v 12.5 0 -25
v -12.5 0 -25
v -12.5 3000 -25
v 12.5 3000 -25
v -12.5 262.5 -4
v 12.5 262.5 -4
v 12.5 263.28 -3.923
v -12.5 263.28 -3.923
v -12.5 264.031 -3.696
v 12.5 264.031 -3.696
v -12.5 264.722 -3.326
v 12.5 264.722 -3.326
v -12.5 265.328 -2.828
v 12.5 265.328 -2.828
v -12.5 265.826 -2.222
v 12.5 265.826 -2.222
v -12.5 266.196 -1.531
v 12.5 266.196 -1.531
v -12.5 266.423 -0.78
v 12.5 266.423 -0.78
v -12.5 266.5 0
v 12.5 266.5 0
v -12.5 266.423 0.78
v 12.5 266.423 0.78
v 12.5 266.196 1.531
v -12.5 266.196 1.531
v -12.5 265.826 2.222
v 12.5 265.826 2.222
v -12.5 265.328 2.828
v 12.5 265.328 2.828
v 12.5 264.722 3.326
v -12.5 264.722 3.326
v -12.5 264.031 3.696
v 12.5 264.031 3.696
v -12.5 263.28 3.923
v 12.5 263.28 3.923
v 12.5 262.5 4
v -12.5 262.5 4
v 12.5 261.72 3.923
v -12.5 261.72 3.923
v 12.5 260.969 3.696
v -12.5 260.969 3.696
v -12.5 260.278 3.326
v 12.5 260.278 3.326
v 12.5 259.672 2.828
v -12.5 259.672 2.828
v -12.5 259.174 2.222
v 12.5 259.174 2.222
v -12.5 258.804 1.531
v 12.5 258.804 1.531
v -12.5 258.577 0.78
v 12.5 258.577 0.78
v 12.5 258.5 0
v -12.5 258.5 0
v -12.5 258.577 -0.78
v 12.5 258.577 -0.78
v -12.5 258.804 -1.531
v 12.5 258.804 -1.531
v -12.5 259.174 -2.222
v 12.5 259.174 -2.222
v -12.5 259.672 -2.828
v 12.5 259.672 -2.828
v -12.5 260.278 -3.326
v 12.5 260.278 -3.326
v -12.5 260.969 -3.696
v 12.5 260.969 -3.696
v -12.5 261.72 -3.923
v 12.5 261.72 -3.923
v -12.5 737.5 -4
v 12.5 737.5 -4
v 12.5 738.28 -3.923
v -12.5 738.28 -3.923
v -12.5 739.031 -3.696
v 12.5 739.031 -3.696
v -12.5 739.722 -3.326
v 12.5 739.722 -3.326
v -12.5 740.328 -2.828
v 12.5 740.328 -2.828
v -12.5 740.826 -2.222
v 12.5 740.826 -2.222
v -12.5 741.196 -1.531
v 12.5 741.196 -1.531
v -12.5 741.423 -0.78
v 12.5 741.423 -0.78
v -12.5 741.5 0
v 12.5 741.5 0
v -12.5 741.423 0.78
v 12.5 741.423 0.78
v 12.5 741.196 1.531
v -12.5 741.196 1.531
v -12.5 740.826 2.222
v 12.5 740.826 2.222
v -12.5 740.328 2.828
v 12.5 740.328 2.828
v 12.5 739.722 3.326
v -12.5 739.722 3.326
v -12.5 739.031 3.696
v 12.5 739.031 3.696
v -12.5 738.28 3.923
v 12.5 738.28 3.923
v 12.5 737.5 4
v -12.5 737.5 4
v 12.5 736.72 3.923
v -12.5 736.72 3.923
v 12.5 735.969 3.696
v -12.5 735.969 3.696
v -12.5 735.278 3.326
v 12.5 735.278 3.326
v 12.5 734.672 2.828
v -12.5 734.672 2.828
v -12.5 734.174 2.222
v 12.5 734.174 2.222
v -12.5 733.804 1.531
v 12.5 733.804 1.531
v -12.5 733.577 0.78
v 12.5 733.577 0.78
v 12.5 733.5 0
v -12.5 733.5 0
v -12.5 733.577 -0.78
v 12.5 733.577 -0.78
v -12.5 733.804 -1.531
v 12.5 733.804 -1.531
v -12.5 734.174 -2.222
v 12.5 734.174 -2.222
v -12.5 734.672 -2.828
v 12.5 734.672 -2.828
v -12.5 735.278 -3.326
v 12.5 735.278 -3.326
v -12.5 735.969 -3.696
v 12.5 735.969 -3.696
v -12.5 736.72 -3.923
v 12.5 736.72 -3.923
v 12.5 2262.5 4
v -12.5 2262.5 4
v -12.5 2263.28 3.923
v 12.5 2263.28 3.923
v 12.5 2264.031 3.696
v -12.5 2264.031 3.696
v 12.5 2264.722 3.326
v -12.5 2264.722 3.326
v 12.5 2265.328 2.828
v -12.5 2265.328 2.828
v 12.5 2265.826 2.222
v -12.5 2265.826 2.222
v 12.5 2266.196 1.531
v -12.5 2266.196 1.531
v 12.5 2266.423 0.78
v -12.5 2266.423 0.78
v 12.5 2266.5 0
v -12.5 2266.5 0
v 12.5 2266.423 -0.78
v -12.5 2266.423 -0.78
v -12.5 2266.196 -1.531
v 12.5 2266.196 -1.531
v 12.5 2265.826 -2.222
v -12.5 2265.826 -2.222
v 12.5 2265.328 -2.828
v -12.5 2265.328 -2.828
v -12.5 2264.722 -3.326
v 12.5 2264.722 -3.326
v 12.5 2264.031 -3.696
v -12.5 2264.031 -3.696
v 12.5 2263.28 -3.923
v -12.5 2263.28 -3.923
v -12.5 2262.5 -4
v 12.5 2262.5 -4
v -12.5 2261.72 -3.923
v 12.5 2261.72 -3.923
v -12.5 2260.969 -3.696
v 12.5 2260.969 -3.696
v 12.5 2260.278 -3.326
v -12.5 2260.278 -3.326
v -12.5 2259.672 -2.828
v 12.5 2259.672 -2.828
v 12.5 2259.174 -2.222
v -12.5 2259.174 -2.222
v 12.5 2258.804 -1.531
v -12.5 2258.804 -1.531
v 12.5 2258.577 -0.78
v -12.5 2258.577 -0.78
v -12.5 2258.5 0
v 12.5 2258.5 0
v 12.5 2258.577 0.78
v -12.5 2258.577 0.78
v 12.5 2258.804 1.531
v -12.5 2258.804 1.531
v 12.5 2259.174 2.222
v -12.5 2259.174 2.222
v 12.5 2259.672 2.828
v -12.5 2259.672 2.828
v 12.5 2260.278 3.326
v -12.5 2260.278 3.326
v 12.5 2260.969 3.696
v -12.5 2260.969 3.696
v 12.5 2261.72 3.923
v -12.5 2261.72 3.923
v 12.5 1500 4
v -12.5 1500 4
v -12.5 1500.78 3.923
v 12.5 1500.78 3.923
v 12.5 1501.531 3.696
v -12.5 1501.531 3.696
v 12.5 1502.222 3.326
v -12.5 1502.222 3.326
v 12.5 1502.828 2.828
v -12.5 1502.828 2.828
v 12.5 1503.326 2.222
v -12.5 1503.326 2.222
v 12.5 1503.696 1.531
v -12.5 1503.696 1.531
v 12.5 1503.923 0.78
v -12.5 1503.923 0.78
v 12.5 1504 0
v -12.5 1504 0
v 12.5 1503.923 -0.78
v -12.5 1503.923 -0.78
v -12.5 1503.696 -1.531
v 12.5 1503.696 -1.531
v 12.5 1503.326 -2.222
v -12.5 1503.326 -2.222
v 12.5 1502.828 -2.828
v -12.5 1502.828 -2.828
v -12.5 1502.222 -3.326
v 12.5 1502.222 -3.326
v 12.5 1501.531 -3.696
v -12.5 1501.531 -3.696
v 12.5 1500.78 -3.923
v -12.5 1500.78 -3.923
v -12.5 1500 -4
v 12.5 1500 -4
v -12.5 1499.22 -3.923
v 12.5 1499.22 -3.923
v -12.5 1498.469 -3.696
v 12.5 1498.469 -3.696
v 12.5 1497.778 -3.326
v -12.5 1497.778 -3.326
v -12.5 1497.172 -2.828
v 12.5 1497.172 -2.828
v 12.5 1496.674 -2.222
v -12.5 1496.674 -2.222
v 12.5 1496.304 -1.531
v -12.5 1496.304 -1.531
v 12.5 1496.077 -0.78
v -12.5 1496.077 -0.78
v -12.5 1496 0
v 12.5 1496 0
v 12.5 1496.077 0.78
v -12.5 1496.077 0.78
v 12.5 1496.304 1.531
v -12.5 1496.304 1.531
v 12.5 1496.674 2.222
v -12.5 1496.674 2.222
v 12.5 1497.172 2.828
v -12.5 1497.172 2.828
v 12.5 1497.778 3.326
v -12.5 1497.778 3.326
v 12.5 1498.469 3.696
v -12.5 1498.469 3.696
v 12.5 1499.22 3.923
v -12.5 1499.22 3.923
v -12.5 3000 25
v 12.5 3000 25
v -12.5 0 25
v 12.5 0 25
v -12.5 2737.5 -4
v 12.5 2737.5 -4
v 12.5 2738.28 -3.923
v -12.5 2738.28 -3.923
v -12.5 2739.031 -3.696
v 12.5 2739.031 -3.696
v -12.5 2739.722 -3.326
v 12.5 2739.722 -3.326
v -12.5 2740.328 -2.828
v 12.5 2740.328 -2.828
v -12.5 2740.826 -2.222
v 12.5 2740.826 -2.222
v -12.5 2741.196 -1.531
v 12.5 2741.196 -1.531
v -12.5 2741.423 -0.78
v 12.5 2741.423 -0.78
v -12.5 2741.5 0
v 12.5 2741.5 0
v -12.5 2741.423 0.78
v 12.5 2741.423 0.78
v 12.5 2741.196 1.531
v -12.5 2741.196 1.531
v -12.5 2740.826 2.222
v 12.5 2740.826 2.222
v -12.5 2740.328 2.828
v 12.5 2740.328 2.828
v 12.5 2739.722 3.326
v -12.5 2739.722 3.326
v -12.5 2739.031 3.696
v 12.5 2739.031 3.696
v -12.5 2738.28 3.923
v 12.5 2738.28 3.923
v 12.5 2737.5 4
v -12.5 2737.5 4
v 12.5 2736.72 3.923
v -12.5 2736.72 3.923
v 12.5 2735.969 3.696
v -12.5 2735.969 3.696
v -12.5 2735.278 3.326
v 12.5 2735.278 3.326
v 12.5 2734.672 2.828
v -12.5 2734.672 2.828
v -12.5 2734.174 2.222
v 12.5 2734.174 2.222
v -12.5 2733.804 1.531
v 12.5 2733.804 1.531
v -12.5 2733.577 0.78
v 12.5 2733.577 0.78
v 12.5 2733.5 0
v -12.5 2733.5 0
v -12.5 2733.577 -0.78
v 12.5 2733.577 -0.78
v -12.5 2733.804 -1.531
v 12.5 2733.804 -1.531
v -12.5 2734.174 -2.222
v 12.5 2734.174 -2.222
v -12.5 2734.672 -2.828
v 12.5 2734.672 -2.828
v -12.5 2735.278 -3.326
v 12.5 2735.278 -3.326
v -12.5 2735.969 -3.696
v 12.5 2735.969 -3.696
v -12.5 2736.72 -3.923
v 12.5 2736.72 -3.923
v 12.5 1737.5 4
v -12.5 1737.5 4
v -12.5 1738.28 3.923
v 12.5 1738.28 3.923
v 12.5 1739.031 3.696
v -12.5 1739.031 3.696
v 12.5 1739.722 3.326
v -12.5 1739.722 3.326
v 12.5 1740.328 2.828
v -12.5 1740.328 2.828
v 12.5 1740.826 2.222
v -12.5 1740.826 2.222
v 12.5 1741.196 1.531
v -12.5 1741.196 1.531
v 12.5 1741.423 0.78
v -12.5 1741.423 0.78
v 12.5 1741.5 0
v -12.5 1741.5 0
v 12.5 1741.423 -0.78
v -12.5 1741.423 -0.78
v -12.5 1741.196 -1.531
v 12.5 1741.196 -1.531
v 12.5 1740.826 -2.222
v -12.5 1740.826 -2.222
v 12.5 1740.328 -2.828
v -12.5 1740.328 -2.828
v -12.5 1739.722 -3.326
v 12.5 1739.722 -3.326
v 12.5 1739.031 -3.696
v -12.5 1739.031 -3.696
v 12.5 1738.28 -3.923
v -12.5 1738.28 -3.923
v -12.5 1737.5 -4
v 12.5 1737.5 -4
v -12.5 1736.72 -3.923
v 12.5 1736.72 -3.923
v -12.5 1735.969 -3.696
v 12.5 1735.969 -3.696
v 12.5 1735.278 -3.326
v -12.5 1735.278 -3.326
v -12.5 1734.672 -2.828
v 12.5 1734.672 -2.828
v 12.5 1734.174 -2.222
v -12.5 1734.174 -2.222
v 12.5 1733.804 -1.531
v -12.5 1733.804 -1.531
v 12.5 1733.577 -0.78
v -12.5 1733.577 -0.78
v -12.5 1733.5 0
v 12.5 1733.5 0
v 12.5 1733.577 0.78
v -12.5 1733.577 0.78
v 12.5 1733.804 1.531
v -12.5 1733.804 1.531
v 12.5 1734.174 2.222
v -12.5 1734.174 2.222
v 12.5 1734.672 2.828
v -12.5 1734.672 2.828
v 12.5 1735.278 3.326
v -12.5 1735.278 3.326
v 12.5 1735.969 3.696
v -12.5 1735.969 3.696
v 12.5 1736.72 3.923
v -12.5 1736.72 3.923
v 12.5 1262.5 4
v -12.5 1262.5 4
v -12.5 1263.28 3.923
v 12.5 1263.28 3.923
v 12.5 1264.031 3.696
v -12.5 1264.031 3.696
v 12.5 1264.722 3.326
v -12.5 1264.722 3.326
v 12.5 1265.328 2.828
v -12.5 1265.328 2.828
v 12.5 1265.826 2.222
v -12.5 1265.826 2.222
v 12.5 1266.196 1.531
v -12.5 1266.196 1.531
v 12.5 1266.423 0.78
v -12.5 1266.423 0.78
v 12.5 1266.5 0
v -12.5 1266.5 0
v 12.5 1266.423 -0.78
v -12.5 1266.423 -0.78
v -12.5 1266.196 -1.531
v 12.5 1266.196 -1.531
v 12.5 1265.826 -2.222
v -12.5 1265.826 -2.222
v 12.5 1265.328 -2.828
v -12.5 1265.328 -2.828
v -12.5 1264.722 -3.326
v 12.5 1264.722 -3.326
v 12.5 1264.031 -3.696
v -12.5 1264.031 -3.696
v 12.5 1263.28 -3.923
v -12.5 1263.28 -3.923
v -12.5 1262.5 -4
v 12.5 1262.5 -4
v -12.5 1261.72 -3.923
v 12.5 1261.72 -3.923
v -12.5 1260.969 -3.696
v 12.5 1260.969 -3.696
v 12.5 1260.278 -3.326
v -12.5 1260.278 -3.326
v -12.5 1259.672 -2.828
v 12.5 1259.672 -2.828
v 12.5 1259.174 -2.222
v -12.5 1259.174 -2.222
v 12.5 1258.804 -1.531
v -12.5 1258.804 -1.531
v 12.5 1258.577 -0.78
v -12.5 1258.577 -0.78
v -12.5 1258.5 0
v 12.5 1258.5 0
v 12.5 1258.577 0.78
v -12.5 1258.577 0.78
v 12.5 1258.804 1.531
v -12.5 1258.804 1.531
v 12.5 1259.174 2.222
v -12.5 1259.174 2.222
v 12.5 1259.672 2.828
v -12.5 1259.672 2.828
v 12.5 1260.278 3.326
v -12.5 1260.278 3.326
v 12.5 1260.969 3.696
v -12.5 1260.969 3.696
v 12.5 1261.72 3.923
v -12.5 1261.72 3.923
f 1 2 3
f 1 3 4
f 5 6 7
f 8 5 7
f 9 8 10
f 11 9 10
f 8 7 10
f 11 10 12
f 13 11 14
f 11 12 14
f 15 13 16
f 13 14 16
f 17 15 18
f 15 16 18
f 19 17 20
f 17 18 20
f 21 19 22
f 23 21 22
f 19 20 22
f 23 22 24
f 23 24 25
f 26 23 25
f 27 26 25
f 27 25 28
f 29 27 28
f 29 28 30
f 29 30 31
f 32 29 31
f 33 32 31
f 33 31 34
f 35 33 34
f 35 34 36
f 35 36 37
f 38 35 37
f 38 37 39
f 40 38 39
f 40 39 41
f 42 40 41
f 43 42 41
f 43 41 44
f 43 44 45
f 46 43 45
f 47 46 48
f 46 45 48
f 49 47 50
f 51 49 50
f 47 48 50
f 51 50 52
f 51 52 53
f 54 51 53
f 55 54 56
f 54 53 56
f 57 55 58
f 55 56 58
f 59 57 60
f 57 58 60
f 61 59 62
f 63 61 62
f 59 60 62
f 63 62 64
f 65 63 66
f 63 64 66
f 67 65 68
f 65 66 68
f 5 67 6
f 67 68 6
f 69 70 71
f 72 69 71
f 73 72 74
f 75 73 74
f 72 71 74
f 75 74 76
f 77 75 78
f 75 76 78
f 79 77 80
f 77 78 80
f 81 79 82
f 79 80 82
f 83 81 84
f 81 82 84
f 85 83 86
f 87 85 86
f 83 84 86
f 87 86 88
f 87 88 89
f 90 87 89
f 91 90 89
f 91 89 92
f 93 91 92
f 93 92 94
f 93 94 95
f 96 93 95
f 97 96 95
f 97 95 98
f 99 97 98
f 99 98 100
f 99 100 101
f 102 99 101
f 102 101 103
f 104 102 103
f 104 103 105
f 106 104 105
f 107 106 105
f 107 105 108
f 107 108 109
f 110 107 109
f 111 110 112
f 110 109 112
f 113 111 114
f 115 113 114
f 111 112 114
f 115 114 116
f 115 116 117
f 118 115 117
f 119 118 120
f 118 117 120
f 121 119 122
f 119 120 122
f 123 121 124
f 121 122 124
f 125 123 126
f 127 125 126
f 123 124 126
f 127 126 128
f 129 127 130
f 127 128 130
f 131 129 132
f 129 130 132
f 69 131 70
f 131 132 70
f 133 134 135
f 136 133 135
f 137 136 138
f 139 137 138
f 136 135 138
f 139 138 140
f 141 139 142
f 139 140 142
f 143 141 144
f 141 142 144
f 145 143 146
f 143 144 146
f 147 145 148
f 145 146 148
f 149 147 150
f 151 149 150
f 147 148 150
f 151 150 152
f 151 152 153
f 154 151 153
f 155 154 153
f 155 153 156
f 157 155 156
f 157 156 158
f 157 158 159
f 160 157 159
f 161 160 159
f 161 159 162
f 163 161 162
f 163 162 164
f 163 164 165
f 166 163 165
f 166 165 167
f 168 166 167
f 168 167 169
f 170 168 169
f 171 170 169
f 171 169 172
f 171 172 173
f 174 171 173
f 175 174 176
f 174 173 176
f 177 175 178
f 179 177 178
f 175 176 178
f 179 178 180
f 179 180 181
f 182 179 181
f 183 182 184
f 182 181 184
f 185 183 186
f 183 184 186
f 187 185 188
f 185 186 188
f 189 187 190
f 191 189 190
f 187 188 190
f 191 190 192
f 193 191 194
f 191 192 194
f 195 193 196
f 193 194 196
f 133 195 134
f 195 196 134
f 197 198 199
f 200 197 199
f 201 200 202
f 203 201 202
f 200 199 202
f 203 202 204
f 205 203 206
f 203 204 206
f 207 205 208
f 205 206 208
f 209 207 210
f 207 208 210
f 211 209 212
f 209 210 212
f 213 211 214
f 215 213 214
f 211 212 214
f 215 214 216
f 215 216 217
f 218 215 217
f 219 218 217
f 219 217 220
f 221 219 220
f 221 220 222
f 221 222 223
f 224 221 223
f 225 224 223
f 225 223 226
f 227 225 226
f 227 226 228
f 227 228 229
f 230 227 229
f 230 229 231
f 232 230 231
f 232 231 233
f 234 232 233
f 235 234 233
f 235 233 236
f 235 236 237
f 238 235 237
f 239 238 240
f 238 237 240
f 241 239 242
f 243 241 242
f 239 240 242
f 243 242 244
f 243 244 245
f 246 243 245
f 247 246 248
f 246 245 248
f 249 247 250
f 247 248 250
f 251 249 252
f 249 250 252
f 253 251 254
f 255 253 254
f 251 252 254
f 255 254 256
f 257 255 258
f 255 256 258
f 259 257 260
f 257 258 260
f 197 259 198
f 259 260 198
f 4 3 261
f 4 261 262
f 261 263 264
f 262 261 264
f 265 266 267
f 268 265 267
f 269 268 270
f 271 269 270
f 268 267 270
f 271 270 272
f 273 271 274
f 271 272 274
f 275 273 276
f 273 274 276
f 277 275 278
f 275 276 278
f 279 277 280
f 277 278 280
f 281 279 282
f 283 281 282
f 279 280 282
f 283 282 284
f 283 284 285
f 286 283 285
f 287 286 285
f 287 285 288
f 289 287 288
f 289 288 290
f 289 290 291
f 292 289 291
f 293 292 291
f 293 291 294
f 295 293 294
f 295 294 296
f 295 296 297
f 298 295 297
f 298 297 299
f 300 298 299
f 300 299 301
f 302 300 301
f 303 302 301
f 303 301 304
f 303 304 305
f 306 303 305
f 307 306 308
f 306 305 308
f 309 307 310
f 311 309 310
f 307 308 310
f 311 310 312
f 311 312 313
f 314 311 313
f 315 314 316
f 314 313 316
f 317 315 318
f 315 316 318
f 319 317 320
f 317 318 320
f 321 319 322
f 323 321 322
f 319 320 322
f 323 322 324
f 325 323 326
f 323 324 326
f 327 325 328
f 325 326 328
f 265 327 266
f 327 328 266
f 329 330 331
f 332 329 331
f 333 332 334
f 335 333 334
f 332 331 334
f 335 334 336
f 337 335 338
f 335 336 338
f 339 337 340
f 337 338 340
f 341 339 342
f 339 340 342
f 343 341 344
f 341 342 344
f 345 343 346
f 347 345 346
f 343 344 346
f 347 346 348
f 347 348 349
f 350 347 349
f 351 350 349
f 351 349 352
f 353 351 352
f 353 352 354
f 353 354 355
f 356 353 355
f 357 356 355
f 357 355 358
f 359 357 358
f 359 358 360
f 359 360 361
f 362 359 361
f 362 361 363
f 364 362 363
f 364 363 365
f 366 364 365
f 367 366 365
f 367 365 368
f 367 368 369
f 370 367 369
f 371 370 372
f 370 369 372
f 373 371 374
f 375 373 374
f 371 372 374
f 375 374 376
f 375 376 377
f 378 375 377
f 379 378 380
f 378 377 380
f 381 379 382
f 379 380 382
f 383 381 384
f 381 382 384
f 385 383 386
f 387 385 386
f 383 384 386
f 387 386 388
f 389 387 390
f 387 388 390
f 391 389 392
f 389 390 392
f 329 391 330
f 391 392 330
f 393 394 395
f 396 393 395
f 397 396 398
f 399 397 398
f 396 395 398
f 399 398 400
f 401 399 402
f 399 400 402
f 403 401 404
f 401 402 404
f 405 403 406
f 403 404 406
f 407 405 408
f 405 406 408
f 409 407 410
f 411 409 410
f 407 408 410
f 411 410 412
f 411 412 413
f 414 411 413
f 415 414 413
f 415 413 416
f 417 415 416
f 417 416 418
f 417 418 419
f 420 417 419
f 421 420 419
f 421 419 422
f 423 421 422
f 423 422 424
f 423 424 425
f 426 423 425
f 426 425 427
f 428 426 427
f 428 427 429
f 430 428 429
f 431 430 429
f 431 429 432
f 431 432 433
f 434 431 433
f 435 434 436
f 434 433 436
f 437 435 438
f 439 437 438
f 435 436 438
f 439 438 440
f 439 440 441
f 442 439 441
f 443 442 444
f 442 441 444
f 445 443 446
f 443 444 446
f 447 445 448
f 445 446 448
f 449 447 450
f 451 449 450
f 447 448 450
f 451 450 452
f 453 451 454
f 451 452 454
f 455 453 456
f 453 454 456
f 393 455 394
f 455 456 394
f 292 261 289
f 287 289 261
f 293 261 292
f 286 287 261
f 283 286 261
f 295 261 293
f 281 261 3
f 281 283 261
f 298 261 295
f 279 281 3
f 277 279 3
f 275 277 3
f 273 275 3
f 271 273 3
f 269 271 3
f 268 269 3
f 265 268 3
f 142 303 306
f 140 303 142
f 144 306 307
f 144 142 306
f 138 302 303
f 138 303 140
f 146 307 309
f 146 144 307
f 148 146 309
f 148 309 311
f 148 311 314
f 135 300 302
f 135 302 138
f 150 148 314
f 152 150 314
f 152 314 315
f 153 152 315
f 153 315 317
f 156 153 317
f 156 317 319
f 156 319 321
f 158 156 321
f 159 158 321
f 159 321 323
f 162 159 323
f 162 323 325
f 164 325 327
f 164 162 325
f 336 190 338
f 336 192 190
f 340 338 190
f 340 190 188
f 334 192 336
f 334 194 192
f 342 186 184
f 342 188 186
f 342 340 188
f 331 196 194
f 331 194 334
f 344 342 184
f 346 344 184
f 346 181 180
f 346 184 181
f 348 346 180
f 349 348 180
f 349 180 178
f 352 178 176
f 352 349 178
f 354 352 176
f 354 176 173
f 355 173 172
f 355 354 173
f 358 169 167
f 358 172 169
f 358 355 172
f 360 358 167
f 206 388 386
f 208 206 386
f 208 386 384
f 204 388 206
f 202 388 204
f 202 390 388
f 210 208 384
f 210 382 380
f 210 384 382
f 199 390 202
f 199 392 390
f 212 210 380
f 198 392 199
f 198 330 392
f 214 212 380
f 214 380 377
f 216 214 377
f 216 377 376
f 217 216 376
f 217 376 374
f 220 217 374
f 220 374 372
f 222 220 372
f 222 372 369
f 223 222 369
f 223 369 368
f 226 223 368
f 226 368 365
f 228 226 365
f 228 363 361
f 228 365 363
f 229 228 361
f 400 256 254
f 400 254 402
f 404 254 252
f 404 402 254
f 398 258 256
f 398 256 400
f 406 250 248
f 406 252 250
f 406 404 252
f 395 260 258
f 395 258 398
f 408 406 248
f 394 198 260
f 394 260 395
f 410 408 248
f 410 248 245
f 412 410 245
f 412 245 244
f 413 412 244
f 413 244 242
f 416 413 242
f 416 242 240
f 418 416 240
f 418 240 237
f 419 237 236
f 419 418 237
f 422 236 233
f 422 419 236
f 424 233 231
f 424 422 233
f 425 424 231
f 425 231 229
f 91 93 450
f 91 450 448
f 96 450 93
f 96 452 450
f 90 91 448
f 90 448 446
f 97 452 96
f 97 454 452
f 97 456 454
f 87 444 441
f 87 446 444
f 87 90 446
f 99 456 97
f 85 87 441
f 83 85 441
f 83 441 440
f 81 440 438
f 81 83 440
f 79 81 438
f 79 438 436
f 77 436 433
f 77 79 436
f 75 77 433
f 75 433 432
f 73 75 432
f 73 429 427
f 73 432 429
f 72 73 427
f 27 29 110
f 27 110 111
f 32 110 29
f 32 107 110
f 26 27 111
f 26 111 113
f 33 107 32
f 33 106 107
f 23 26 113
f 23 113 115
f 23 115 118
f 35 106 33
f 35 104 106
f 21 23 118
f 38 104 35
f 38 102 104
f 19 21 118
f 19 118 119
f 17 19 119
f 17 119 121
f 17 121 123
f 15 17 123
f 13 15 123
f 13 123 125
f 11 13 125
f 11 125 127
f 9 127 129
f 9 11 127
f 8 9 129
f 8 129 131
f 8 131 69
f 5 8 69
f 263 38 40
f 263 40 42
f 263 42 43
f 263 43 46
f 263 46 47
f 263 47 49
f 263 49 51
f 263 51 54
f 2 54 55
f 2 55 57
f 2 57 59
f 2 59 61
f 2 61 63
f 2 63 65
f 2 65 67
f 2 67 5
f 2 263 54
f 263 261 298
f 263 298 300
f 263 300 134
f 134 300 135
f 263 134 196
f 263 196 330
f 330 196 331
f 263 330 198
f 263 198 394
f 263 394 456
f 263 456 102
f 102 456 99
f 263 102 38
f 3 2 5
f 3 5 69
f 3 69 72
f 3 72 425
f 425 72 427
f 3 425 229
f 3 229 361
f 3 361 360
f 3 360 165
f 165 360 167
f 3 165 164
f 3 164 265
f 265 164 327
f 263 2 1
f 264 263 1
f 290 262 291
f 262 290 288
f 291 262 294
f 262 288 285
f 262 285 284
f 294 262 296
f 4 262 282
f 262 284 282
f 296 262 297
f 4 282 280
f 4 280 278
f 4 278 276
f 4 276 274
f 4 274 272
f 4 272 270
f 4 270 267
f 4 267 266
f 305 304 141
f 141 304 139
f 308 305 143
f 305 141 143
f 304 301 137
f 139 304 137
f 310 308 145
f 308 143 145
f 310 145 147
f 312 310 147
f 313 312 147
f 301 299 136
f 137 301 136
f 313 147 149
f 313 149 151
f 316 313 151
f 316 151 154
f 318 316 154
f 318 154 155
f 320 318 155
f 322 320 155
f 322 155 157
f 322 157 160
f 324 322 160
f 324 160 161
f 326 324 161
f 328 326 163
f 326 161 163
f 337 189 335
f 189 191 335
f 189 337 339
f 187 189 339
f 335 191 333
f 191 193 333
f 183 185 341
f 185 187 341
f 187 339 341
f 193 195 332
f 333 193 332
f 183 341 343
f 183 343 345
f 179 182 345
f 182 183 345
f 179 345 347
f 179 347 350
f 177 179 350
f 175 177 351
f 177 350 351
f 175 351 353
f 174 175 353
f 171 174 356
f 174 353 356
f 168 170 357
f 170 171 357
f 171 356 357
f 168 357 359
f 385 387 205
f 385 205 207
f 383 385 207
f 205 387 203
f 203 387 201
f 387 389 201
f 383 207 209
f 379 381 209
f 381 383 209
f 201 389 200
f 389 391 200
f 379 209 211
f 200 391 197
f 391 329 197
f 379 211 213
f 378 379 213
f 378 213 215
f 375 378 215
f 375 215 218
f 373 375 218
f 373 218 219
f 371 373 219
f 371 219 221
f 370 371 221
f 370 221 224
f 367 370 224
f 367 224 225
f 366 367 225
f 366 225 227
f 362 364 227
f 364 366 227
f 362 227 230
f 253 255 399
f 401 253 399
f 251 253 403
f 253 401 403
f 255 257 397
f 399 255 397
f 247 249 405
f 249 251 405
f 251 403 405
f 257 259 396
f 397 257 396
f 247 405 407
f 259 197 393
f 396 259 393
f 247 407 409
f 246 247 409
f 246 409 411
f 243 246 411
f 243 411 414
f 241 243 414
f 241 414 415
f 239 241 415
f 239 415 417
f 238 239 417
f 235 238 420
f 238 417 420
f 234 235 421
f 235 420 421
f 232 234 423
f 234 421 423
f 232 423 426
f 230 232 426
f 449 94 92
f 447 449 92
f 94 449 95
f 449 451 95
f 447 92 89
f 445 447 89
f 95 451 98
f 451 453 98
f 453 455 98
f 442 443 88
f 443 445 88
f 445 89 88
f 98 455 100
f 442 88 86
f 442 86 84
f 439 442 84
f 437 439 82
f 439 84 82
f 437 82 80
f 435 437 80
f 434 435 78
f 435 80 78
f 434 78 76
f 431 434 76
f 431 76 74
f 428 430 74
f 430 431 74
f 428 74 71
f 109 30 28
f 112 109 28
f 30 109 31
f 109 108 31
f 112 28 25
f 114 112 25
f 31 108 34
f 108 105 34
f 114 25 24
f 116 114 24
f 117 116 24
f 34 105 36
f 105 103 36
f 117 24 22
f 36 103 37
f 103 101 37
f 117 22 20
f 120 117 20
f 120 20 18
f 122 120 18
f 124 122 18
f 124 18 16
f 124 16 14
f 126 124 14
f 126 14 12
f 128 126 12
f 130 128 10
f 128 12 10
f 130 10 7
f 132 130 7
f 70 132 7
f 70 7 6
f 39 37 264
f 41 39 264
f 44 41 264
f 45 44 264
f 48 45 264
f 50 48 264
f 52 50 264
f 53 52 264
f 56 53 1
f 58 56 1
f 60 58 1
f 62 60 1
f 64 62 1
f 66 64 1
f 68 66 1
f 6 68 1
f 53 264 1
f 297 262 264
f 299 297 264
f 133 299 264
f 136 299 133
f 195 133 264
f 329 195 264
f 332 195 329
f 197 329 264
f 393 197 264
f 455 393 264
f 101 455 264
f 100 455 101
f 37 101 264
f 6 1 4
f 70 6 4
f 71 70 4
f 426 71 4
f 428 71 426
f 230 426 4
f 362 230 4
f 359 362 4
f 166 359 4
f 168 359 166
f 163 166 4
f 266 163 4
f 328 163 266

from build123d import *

# Parameters (mm, degrees)
SKETCH_1_W          = 25
SKETCH_1_H          = 50
EXTRUDE_1_DEPTH     = 3000
SKETCH_2_R          = 4
CUT_EXTRUDE_1_DEPTH = 3000
SKETCH_3_R          = 4
CUT_EXTRUDE_2_DEPTH = 3000
SKETCH_4_R          = 4
CUT_EXTRUDE_3_DEPTH = 3000
SKETCH_5_R          = 4
CUT_EXTRUDE_4_DEPTH = 50


with BuildPart() as part:
    # Эскиз1 → Бобышка-Вытянуть1 (new body)
    with BuildSketch(Plane(origin=(0, 0, 0), x_dir=(1, 0, 0), z_dir=(0, 1, 0))):
        Rectangle(SKETCH_1_W, SKETCH_1_H)
    extrude(amount=EXTRUDE_1_DEPTH)

    # Эскиз2 → Вырез-Вытянуть1 (cut)
    with BuildSketch(Plane(origin=(12.5, 0, 0), x_dir=(0, 0, -1), z_dir=(1, 0, 0))):
        with Locations((0, 2737.5)):
            Circle(SKETCH_2_R)
        with Locations((0, 262.5)):
            Circle(SKETCH_2_R)
        with Locations((0, 737.5)):
            Circle(SKETCH_2_R)
    extrude(amount=-CUT_EXTRUDE_1_DEPTH, mode=Mode.SUBTRACT)

    # Эскиз3 → Вырез-Вытянуть2 (cut)
    with BuildSketch(Plane.ZY.offset(12.5)):
        with Locations((0, 2262.5)):
            Circle(SKETCH_3_R)
    extrude(amount=-CUT_EXTRUDE_2_DEPTH, mode=Mode.SUBTRACT)

    # Эскиз4 → Вырез-Вытянуть3 (cut)
    with BuildSketch(Plane.ZY.offset(12.5)):
        with Locations((0, 1737.5)):
            Circle(SKETCH_4_R)
        with Locations((0, 1262.5)):
            Circle(SKETCH_4_R)
    extrude(amount=-CUT_EXTRUDE_3_DEPTH, mode=Mode.SUBTRACT)

    # Эскиз5 → Вырез-Вытянуть4 (cut)
    with BuildSketch(Plane.ZY.offset(12.5)):
        with Locations((0, 1500)):
            Circle(SKETCH_5_R)
    extrude(amount=-CUT_EXTRUDE_4_DEPTH, mode=Mode.SUBTRACT)


solid = part.part
